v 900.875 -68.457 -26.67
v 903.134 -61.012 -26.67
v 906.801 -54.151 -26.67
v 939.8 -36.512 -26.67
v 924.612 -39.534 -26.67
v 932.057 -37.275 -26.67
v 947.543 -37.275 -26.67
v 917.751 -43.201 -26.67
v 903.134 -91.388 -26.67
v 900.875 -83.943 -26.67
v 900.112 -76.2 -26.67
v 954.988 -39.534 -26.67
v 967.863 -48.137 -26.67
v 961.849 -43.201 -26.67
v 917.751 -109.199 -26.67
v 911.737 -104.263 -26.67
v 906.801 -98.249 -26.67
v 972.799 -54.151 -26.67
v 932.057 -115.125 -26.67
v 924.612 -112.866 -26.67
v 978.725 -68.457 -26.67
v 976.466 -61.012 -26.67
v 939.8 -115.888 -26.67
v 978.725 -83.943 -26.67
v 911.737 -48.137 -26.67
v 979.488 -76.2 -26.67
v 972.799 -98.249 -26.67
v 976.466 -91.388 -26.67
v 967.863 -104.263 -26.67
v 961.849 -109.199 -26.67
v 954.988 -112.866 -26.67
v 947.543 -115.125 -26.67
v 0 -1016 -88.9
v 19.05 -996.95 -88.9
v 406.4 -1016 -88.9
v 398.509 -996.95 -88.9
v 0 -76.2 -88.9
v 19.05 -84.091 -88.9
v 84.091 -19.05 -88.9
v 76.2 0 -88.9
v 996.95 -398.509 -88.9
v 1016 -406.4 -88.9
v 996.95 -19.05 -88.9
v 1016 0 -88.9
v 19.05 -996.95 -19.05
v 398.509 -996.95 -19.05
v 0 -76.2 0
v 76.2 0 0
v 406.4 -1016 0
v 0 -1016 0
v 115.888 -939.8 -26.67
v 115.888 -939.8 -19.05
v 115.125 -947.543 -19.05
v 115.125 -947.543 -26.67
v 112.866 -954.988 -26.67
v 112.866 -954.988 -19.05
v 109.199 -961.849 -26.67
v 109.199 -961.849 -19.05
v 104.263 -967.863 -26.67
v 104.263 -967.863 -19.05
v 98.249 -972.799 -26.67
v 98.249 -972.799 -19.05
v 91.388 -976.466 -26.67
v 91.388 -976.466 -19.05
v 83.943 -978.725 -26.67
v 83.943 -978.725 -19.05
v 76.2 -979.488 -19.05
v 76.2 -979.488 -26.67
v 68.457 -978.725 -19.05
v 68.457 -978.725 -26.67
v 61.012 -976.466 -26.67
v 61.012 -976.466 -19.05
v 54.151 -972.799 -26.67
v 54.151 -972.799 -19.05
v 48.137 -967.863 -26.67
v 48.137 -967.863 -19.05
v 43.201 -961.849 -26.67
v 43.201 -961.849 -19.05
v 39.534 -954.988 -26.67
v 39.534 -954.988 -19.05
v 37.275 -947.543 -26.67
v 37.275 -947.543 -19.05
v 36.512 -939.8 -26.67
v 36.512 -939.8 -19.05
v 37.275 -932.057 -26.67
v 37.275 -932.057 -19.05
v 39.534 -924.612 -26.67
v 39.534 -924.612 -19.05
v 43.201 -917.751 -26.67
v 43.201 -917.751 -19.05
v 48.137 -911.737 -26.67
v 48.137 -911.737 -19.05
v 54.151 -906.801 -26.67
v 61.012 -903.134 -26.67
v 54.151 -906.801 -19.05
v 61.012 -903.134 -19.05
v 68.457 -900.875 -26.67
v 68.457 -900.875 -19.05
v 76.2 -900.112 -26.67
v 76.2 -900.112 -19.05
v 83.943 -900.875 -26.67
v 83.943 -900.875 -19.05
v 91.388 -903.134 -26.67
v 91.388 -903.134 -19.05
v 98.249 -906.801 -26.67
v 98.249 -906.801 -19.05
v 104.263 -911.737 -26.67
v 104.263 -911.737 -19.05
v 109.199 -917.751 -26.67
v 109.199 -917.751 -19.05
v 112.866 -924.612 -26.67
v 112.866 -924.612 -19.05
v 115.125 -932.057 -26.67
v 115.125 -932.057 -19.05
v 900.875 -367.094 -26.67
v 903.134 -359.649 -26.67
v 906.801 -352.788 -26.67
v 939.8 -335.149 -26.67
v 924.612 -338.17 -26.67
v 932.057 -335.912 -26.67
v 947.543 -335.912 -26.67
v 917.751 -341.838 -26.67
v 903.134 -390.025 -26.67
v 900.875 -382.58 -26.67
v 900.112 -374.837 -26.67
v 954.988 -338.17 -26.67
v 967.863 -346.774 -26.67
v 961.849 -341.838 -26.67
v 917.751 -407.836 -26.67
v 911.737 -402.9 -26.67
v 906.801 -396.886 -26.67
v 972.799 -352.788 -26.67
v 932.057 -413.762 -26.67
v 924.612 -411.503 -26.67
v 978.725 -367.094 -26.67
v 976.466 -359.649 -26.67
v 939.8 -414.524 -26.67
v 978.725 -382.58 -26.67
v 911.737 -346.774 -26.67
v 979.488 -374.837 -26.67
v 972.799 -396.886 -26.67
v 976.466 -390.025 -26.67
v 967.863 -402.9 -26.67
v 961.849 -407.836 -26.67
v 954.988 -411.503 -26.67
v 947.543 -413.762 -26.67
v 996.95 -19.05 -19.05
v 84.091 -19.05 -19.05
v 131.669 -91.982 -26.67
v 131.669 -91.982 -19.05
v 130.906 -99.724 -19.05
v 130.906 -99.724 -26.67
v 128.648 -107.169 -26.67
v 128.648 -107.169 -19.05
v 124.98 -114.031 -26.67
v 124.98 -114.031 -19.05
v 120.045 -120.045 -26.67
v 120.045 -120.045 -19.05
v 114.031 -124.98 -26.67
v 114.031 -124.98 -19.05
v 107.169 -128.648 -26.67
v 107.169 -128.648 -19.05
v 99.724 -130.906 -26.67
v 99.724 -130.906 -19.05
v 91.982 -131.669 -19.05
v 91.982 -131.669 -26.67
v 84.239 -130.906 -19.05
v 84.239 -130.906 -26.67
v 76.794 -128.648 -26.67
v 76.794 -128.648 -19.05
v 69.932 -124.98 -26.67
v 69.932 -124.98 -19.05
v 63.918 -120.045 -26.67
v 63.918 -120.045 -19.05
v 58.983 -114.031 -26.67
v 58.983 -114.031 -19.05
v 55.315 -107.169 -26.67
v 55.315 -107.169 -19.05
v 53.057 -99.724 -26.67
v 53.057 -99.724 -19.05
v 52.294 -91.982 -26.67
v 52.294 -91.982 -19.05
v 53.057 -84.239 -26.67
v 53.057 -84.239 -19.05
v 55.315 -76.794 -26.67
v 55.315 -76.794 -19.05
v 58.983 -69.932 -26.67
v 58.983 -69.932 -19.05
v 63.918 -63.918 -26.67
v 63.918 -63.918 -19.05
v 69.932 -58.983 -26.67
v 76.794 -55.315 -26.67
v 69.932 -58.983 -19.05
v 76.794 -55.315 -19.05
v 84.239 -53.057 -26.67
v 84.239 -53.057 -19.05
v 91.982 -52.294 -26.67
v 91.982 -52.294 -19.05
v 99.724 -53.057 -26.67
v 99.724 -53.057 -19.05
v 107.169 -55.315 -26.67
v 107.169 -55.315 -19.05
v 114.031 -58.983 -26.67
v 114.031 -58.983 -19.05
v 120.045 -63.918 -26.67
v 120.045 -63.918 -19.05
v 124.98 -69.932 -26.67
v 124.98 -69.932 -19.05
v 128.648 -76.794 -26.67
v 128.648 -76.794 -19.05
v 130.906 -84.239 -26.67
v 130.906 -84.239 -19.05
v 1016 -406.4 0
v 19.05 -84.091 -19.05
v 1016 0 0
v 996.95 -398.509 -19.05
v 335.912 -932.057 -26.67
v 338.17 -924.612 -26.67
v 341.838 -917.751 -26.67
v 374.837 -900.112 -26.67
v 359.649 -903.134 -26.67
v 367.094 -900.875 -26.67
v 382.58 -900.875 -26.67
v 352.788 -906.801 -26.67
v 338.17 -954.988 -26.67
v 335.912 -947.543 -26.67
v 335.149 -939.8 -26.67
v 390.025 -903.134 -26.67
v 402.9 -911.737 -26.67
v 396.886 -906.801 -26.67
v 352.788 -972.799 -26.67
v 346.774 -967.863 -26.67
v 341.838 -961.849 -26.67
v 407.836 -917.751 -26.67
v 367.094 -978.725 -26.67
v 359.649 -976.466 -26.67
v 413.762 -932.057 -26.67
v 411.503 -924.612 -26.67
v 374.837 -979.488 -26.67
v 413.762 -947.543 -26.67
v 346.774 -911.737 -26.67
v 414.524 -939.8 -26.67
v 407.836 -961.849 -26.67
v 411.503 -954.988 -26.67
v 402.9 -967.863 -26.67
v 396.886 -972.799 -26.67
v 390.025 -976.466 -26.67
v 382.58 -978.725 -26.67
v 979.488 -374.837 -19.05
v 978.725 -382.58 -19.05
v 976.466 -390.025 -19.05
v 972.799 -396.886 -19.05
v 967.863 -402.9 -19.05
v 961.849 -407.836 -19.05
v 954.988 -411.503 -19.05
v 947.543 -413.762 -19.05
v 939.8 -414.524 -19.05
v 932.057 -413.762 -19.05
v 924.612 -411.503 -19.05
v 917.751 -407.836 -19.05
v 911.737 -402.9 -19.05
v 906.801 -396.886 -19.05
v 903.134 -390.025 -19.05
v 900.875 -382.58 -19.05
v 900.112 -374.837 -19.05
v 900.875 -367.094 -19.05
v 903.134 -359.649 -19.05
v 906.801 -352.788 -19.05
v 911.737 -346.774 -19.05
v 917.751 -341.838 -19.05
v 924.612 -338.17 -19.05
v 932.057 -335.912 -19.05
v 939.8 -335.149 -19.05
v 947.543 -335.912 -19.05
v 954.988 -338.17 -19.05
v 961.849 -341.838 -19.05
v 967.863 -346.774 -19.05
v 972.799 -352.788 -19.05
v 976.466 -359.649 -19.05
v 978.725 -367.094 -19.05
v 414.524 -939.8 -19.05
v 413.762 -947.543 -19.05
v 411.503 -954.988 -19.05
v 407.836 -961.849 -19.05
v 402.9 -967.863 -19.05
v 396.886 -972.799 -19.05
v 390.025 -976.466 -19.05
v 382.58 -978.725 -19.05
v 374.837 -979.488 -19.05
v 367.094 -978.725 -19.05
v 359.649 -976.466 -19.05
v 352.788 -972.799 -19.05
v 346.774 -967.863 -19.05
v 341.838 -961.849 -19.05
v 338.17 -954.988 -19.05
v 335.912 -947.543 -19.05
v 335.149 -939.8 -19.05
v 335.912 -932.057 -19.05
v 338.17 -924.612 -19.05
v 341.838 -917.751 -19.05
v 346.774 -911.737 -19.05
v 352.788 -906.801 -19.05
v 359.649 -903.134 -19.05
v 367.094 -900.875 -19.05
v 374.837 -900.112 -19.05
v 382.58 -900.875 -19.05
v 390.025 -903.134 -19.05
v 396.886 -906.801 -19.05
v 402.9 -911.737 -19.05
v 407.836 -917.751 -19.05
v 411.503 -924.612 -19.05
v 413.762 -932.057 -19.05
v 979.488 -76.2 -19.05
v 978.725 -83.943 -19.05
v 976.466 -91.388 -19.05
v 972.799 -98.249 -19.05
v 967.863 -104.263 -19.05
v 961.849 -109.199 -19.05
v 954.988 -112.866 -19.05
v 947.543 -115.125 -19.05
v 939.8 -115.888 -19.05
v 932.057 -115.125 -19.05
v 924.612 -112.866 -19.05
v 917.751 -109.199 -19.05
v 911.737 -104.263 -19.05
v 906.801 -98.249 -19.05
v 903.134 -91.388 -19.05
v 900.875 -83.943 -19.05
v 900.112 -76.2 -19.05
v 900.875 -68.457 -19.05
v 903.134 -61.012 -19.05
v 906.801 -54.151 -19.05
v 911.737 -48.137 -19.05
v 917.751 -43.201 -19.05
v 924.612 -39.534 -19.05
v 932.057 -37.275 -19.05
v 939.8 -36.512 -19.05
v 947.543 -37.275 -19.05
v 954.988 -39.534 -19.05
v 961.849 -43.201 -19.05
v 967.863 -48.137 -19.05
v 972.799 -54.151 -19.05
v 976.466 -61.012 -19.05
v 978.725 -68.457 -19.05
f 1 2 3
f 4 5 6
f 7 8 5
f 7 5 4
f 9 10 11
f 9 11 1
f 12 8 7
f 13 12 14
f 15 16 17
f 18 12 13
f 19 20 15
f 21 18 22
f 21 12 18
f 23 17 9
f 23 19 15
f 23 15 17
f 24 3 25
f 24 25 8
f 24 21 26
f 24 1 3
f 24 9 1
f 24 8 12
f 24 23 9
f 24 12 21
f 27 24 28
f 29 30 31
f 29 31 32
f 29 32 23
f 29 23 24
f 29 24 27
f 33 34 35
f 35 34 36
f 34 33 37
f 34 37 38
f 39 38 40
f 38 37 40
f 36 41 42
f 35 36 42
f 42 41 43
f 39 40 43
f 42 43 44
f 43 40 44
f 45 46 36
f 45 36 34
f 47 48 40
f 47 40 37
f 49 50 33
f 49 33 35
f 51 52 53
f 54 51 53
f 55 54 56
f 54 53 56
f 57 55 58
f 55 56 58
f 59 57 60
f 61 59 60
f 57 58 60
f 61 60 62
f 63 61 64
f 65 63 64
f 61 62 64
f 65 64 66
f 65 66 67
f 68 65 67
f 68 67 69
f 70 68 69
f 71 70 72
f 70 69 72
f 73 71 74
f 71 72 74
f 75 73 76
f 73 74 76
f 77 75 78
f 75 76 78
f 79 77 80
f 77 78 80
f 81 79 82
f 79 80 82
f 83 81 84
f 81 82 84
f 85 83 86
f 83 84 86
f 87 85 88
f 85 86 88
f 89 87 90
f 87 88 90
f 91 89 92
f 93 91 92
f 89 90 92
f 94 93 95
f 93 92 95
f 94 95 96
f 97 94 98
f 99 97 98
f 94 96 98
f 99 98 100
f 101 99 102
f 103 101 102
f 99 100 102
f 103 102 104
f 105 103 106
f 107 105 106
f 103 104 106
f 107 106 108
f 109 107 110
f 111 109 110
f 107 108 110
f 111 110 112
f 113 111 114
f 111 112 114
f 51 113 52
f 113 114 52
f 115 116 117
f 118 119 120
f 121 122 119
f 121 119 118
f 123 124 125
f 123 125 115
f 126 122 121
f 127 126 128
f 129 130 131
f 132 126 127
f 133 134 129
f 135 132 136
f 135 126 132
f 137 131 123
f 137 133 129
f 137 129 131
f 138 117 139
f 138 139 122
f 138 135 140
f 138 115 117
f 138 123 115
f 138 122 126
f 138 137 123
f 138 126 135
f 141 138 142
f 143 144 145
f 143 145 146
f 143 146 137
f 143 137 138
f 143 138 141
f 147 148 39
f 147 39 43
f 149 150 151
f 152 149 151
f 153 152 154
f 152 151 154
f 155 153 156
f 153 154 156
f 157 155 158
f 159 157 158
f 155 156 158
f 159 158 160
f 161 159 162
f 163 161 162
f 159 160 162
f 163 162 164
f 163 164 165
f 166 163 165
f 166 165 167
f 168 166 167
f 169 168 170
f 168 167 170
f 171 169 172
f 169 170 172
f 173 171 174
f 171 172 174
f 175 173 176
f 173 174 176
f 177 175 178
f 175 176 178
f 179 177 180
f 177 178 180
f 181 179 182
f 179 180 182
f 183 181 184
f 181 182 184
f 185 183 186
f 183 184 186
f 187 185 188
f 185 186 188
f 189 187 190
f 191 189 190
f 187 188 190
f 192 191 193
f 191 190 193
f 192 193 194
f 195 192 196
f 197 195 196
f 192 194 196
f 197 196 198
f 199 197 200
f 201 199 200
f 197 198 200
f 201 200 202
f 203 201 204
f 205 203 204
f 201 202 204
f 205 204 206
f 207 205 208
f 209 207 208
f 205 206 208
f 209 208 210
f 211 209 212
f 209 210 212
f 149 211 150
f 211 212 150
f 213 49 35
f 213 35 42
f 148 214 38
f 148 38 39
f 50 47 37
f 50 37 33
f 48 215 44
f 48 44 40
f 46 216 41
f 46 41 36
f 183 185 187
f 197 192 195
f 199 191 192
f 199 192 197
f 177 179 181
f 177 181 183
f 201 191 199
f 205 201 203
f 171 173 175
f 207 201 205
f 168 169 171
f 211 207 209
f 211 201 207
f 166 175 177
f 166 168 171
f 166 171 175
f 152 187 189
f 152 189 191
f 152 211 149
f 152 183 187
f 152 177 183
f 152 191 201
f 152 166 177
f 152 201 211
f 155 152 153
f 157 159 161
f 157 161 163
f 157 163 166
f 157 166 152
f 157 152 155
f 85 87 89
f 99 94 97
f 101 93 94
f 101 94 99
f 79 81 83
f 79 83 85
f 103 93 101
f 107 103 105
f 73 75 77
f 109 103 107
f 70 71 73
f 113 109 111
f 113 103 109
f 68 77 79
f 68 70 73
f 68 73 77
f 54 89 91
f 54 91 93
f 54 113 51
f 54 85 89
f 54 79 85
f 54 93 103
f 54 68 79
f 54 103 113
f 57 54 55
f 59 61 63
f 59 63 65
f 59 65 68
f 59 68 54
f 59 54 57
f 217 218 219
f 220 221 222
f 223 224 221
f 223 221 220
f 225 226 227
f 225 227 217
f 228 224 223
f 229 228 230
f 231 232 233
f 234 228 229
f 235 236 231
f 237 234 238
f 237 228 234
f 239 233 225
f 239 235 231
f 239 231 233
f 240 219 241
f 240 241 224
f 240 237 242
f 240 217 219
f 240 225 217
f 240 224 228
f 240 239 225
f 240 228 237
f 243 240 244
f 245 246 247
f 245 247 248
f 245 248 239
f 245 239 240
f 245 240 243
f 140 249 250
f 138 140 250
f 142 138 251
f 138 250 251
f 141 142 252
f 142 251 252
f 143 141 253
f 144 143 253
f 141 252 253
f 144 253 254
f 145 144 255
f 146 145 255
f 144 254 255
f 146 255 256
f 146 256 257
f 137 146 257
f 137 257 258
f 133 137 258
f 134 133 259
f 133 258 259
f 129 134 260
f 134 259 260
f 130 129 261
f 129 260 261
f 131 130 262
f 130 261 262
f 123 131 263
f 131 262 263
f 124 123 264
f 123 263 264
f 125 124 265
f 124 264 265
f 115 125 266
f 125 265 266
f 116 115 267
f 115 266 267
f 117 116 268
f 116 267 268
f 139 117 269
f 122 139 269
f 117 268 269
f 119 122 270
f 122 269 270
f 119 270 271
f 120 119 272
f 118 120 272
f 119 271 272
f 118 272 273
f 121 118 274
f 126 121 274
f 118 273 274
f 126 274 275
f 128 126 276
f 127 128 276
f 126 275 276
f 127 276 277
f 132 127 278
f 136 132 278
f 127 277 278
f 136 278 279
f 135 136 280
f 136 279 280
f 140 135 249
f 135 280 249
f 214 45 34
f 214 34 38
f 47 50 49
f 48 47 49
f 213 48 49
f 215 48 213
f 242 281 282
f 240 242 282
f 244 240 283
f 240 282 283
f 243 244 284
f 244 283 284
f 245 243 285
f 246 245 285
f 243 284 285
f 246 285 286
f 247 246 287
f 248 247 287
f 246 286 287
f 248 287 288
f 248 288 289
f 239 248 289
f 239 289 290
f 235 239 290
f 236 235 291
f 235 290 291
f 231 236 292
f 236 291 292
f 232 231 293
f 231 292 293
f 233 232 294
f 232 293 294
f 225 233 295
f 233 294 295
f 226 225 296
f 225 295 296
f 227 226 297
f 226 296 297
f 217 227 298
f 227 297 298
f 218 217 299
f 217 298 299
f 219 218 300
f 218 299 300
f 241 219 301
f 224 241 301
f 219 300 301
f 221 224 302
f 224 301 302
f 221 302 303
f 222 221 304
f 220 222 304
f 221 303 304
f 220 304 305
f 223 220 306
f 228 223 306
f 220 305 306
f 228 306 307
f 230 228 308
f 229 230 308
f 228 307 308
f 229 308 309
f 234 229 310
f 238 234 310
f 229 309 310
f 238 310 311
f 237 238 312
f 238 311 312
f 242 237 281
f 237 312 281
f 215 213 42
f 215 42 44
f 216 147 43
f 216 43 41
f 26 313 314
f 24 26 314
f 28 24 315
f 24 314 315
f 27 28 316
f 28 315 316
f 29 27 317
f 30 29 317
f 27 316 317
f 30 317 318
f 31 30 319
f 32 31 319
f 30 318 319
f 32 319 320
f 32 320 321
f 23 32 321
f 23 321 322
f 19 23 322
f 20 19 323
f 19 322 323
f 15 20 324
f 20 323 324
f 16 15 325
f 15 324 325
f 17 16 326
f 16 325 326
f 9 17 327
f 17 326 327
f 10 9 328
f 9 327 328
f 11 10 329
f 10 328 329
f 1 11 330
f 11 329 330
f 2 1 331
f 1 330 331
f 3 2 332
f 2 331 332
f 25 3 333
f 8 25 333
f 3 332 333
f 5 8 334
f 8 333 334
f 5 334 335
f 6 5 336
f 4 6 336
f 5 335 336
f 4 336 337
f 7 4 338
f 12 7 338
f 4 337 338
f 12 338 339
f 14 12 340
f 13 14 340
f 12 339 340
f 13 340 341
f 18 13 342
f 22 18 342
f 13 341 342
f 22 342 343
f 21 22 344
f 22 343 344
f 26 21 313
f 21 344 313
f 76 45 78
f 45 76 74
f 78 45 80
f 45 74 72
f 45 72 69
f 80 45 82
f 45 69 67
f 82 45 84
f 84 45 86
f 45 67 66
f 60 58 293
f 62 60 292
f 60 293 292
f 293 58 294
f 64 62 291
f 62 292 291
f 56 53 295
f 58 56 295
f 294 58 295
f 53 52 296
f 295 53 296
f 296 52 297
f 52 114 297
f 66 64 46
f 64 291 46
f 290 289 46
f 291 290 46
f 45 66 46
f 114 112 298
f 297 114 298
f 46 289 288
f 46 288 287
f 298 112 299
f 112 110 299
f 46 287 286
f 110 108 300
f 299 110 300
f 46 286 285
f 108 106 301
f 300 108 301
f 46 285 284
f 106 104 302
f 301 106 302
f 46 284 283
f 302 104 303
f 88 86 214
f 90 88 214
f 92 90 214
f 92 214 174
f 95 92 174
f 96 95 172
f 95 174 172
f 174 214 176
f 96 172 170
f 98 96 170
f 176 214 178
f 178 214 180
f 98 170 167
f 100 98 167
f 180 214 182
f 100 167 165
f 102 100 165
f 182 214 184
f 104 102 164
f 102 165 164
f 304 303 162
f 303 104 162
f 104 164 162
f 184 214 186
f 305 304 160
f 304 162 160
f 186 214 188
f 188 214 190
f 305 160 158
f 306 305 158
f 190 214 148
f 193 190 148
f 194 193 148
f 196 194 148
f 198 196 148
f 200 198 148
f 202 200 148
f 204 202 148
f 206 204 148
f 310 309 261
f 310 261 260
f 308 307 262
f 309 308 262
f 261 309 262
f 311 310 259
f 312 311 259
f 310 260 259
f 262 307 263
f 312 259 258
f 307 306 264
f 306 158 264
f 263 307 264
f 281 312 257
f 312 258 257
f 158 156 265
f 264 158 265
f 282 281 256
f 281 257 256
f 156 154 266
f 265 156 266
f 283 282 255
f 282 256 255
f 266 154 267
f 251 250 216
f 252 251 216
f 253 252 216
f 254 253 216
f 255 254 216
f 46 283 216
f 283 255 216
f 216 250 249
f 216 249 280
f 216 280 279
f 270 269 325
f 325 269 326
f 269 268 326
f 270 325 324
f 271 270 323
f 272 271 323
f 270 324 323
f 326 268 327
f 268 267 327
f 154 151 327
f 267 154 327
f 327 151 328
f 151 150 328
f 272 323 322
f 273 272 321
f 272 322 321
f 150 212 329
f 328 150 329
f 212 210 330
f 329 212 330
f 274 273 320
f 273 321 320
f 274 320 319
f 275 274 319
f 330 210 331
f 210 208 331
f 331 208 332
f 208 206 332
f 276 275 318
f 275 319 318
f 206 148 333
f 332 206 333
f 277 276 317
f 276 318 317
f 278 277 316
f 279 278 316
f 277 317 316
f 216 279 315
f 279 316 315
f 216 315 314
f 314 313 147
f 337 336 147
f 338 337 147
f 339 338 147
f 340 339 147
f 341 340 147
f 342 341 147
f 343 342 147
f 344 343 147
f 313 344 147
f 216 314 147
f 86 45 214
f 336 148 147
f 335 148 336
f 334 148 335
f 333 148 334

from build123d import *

# Parameters (mm, degrees)
F1_DEPTH = 88.9
F2_DEPTH = 19.05
F3_R     = 39.6875
F4_DEPTH = 7.62


with BuildPart() as f1:
    # F0 (on Top) → F1 (new body)
    with BuildSketch(Plane.XY):
        Polygon((0, -76.2), (0, -1016), (406.4, -1016), (1016, -406.4), (1016, 0), (76.2, 0), align=None)
        Polygon((398.509232, -996.95), (19.05, -996.95), (19.05, -84.090768), (84.090768, -19.05), (996.95, -19.05), (996.95, -398.509232), align=None, mode=Mode.SUBTRACT)
    extrude(amount=-F1_DEPTH)

    # F0 (on Top) → F2 (join)
    with BuildSketch(Plane.XY):
        Polygon((19.05, -84.090768), (19.05, -996.95), (398.509232, -996.95), (996.95, -398.509232), (996.95, -19.05), (84.090768, -19.05), align=None)
    extrude(amount=-F2_DEPTH)

    # F3 (on face) → F4 (join)
    with BuildSketch(Plane(origin=(0, 0, -19.05), x_dir=(1, 0, 0), z_dir=(0, 0, -1))):
        with Locations((76.2, 939.8)):
            Circle(F3_R)
        with Locations((91.981537, 91.981537)):
            Circle(F3_R)
        with Locations((374.836927, 939.8)):
            Circle(F3_R)
        with Locations((939.8, 374.836927)):
            Circle(F3_R)
        with Locations((939.8, 76.2)):
            Circle(F3_R)
    extrude(amount=F4_DEPTH)


solid = f1.part
